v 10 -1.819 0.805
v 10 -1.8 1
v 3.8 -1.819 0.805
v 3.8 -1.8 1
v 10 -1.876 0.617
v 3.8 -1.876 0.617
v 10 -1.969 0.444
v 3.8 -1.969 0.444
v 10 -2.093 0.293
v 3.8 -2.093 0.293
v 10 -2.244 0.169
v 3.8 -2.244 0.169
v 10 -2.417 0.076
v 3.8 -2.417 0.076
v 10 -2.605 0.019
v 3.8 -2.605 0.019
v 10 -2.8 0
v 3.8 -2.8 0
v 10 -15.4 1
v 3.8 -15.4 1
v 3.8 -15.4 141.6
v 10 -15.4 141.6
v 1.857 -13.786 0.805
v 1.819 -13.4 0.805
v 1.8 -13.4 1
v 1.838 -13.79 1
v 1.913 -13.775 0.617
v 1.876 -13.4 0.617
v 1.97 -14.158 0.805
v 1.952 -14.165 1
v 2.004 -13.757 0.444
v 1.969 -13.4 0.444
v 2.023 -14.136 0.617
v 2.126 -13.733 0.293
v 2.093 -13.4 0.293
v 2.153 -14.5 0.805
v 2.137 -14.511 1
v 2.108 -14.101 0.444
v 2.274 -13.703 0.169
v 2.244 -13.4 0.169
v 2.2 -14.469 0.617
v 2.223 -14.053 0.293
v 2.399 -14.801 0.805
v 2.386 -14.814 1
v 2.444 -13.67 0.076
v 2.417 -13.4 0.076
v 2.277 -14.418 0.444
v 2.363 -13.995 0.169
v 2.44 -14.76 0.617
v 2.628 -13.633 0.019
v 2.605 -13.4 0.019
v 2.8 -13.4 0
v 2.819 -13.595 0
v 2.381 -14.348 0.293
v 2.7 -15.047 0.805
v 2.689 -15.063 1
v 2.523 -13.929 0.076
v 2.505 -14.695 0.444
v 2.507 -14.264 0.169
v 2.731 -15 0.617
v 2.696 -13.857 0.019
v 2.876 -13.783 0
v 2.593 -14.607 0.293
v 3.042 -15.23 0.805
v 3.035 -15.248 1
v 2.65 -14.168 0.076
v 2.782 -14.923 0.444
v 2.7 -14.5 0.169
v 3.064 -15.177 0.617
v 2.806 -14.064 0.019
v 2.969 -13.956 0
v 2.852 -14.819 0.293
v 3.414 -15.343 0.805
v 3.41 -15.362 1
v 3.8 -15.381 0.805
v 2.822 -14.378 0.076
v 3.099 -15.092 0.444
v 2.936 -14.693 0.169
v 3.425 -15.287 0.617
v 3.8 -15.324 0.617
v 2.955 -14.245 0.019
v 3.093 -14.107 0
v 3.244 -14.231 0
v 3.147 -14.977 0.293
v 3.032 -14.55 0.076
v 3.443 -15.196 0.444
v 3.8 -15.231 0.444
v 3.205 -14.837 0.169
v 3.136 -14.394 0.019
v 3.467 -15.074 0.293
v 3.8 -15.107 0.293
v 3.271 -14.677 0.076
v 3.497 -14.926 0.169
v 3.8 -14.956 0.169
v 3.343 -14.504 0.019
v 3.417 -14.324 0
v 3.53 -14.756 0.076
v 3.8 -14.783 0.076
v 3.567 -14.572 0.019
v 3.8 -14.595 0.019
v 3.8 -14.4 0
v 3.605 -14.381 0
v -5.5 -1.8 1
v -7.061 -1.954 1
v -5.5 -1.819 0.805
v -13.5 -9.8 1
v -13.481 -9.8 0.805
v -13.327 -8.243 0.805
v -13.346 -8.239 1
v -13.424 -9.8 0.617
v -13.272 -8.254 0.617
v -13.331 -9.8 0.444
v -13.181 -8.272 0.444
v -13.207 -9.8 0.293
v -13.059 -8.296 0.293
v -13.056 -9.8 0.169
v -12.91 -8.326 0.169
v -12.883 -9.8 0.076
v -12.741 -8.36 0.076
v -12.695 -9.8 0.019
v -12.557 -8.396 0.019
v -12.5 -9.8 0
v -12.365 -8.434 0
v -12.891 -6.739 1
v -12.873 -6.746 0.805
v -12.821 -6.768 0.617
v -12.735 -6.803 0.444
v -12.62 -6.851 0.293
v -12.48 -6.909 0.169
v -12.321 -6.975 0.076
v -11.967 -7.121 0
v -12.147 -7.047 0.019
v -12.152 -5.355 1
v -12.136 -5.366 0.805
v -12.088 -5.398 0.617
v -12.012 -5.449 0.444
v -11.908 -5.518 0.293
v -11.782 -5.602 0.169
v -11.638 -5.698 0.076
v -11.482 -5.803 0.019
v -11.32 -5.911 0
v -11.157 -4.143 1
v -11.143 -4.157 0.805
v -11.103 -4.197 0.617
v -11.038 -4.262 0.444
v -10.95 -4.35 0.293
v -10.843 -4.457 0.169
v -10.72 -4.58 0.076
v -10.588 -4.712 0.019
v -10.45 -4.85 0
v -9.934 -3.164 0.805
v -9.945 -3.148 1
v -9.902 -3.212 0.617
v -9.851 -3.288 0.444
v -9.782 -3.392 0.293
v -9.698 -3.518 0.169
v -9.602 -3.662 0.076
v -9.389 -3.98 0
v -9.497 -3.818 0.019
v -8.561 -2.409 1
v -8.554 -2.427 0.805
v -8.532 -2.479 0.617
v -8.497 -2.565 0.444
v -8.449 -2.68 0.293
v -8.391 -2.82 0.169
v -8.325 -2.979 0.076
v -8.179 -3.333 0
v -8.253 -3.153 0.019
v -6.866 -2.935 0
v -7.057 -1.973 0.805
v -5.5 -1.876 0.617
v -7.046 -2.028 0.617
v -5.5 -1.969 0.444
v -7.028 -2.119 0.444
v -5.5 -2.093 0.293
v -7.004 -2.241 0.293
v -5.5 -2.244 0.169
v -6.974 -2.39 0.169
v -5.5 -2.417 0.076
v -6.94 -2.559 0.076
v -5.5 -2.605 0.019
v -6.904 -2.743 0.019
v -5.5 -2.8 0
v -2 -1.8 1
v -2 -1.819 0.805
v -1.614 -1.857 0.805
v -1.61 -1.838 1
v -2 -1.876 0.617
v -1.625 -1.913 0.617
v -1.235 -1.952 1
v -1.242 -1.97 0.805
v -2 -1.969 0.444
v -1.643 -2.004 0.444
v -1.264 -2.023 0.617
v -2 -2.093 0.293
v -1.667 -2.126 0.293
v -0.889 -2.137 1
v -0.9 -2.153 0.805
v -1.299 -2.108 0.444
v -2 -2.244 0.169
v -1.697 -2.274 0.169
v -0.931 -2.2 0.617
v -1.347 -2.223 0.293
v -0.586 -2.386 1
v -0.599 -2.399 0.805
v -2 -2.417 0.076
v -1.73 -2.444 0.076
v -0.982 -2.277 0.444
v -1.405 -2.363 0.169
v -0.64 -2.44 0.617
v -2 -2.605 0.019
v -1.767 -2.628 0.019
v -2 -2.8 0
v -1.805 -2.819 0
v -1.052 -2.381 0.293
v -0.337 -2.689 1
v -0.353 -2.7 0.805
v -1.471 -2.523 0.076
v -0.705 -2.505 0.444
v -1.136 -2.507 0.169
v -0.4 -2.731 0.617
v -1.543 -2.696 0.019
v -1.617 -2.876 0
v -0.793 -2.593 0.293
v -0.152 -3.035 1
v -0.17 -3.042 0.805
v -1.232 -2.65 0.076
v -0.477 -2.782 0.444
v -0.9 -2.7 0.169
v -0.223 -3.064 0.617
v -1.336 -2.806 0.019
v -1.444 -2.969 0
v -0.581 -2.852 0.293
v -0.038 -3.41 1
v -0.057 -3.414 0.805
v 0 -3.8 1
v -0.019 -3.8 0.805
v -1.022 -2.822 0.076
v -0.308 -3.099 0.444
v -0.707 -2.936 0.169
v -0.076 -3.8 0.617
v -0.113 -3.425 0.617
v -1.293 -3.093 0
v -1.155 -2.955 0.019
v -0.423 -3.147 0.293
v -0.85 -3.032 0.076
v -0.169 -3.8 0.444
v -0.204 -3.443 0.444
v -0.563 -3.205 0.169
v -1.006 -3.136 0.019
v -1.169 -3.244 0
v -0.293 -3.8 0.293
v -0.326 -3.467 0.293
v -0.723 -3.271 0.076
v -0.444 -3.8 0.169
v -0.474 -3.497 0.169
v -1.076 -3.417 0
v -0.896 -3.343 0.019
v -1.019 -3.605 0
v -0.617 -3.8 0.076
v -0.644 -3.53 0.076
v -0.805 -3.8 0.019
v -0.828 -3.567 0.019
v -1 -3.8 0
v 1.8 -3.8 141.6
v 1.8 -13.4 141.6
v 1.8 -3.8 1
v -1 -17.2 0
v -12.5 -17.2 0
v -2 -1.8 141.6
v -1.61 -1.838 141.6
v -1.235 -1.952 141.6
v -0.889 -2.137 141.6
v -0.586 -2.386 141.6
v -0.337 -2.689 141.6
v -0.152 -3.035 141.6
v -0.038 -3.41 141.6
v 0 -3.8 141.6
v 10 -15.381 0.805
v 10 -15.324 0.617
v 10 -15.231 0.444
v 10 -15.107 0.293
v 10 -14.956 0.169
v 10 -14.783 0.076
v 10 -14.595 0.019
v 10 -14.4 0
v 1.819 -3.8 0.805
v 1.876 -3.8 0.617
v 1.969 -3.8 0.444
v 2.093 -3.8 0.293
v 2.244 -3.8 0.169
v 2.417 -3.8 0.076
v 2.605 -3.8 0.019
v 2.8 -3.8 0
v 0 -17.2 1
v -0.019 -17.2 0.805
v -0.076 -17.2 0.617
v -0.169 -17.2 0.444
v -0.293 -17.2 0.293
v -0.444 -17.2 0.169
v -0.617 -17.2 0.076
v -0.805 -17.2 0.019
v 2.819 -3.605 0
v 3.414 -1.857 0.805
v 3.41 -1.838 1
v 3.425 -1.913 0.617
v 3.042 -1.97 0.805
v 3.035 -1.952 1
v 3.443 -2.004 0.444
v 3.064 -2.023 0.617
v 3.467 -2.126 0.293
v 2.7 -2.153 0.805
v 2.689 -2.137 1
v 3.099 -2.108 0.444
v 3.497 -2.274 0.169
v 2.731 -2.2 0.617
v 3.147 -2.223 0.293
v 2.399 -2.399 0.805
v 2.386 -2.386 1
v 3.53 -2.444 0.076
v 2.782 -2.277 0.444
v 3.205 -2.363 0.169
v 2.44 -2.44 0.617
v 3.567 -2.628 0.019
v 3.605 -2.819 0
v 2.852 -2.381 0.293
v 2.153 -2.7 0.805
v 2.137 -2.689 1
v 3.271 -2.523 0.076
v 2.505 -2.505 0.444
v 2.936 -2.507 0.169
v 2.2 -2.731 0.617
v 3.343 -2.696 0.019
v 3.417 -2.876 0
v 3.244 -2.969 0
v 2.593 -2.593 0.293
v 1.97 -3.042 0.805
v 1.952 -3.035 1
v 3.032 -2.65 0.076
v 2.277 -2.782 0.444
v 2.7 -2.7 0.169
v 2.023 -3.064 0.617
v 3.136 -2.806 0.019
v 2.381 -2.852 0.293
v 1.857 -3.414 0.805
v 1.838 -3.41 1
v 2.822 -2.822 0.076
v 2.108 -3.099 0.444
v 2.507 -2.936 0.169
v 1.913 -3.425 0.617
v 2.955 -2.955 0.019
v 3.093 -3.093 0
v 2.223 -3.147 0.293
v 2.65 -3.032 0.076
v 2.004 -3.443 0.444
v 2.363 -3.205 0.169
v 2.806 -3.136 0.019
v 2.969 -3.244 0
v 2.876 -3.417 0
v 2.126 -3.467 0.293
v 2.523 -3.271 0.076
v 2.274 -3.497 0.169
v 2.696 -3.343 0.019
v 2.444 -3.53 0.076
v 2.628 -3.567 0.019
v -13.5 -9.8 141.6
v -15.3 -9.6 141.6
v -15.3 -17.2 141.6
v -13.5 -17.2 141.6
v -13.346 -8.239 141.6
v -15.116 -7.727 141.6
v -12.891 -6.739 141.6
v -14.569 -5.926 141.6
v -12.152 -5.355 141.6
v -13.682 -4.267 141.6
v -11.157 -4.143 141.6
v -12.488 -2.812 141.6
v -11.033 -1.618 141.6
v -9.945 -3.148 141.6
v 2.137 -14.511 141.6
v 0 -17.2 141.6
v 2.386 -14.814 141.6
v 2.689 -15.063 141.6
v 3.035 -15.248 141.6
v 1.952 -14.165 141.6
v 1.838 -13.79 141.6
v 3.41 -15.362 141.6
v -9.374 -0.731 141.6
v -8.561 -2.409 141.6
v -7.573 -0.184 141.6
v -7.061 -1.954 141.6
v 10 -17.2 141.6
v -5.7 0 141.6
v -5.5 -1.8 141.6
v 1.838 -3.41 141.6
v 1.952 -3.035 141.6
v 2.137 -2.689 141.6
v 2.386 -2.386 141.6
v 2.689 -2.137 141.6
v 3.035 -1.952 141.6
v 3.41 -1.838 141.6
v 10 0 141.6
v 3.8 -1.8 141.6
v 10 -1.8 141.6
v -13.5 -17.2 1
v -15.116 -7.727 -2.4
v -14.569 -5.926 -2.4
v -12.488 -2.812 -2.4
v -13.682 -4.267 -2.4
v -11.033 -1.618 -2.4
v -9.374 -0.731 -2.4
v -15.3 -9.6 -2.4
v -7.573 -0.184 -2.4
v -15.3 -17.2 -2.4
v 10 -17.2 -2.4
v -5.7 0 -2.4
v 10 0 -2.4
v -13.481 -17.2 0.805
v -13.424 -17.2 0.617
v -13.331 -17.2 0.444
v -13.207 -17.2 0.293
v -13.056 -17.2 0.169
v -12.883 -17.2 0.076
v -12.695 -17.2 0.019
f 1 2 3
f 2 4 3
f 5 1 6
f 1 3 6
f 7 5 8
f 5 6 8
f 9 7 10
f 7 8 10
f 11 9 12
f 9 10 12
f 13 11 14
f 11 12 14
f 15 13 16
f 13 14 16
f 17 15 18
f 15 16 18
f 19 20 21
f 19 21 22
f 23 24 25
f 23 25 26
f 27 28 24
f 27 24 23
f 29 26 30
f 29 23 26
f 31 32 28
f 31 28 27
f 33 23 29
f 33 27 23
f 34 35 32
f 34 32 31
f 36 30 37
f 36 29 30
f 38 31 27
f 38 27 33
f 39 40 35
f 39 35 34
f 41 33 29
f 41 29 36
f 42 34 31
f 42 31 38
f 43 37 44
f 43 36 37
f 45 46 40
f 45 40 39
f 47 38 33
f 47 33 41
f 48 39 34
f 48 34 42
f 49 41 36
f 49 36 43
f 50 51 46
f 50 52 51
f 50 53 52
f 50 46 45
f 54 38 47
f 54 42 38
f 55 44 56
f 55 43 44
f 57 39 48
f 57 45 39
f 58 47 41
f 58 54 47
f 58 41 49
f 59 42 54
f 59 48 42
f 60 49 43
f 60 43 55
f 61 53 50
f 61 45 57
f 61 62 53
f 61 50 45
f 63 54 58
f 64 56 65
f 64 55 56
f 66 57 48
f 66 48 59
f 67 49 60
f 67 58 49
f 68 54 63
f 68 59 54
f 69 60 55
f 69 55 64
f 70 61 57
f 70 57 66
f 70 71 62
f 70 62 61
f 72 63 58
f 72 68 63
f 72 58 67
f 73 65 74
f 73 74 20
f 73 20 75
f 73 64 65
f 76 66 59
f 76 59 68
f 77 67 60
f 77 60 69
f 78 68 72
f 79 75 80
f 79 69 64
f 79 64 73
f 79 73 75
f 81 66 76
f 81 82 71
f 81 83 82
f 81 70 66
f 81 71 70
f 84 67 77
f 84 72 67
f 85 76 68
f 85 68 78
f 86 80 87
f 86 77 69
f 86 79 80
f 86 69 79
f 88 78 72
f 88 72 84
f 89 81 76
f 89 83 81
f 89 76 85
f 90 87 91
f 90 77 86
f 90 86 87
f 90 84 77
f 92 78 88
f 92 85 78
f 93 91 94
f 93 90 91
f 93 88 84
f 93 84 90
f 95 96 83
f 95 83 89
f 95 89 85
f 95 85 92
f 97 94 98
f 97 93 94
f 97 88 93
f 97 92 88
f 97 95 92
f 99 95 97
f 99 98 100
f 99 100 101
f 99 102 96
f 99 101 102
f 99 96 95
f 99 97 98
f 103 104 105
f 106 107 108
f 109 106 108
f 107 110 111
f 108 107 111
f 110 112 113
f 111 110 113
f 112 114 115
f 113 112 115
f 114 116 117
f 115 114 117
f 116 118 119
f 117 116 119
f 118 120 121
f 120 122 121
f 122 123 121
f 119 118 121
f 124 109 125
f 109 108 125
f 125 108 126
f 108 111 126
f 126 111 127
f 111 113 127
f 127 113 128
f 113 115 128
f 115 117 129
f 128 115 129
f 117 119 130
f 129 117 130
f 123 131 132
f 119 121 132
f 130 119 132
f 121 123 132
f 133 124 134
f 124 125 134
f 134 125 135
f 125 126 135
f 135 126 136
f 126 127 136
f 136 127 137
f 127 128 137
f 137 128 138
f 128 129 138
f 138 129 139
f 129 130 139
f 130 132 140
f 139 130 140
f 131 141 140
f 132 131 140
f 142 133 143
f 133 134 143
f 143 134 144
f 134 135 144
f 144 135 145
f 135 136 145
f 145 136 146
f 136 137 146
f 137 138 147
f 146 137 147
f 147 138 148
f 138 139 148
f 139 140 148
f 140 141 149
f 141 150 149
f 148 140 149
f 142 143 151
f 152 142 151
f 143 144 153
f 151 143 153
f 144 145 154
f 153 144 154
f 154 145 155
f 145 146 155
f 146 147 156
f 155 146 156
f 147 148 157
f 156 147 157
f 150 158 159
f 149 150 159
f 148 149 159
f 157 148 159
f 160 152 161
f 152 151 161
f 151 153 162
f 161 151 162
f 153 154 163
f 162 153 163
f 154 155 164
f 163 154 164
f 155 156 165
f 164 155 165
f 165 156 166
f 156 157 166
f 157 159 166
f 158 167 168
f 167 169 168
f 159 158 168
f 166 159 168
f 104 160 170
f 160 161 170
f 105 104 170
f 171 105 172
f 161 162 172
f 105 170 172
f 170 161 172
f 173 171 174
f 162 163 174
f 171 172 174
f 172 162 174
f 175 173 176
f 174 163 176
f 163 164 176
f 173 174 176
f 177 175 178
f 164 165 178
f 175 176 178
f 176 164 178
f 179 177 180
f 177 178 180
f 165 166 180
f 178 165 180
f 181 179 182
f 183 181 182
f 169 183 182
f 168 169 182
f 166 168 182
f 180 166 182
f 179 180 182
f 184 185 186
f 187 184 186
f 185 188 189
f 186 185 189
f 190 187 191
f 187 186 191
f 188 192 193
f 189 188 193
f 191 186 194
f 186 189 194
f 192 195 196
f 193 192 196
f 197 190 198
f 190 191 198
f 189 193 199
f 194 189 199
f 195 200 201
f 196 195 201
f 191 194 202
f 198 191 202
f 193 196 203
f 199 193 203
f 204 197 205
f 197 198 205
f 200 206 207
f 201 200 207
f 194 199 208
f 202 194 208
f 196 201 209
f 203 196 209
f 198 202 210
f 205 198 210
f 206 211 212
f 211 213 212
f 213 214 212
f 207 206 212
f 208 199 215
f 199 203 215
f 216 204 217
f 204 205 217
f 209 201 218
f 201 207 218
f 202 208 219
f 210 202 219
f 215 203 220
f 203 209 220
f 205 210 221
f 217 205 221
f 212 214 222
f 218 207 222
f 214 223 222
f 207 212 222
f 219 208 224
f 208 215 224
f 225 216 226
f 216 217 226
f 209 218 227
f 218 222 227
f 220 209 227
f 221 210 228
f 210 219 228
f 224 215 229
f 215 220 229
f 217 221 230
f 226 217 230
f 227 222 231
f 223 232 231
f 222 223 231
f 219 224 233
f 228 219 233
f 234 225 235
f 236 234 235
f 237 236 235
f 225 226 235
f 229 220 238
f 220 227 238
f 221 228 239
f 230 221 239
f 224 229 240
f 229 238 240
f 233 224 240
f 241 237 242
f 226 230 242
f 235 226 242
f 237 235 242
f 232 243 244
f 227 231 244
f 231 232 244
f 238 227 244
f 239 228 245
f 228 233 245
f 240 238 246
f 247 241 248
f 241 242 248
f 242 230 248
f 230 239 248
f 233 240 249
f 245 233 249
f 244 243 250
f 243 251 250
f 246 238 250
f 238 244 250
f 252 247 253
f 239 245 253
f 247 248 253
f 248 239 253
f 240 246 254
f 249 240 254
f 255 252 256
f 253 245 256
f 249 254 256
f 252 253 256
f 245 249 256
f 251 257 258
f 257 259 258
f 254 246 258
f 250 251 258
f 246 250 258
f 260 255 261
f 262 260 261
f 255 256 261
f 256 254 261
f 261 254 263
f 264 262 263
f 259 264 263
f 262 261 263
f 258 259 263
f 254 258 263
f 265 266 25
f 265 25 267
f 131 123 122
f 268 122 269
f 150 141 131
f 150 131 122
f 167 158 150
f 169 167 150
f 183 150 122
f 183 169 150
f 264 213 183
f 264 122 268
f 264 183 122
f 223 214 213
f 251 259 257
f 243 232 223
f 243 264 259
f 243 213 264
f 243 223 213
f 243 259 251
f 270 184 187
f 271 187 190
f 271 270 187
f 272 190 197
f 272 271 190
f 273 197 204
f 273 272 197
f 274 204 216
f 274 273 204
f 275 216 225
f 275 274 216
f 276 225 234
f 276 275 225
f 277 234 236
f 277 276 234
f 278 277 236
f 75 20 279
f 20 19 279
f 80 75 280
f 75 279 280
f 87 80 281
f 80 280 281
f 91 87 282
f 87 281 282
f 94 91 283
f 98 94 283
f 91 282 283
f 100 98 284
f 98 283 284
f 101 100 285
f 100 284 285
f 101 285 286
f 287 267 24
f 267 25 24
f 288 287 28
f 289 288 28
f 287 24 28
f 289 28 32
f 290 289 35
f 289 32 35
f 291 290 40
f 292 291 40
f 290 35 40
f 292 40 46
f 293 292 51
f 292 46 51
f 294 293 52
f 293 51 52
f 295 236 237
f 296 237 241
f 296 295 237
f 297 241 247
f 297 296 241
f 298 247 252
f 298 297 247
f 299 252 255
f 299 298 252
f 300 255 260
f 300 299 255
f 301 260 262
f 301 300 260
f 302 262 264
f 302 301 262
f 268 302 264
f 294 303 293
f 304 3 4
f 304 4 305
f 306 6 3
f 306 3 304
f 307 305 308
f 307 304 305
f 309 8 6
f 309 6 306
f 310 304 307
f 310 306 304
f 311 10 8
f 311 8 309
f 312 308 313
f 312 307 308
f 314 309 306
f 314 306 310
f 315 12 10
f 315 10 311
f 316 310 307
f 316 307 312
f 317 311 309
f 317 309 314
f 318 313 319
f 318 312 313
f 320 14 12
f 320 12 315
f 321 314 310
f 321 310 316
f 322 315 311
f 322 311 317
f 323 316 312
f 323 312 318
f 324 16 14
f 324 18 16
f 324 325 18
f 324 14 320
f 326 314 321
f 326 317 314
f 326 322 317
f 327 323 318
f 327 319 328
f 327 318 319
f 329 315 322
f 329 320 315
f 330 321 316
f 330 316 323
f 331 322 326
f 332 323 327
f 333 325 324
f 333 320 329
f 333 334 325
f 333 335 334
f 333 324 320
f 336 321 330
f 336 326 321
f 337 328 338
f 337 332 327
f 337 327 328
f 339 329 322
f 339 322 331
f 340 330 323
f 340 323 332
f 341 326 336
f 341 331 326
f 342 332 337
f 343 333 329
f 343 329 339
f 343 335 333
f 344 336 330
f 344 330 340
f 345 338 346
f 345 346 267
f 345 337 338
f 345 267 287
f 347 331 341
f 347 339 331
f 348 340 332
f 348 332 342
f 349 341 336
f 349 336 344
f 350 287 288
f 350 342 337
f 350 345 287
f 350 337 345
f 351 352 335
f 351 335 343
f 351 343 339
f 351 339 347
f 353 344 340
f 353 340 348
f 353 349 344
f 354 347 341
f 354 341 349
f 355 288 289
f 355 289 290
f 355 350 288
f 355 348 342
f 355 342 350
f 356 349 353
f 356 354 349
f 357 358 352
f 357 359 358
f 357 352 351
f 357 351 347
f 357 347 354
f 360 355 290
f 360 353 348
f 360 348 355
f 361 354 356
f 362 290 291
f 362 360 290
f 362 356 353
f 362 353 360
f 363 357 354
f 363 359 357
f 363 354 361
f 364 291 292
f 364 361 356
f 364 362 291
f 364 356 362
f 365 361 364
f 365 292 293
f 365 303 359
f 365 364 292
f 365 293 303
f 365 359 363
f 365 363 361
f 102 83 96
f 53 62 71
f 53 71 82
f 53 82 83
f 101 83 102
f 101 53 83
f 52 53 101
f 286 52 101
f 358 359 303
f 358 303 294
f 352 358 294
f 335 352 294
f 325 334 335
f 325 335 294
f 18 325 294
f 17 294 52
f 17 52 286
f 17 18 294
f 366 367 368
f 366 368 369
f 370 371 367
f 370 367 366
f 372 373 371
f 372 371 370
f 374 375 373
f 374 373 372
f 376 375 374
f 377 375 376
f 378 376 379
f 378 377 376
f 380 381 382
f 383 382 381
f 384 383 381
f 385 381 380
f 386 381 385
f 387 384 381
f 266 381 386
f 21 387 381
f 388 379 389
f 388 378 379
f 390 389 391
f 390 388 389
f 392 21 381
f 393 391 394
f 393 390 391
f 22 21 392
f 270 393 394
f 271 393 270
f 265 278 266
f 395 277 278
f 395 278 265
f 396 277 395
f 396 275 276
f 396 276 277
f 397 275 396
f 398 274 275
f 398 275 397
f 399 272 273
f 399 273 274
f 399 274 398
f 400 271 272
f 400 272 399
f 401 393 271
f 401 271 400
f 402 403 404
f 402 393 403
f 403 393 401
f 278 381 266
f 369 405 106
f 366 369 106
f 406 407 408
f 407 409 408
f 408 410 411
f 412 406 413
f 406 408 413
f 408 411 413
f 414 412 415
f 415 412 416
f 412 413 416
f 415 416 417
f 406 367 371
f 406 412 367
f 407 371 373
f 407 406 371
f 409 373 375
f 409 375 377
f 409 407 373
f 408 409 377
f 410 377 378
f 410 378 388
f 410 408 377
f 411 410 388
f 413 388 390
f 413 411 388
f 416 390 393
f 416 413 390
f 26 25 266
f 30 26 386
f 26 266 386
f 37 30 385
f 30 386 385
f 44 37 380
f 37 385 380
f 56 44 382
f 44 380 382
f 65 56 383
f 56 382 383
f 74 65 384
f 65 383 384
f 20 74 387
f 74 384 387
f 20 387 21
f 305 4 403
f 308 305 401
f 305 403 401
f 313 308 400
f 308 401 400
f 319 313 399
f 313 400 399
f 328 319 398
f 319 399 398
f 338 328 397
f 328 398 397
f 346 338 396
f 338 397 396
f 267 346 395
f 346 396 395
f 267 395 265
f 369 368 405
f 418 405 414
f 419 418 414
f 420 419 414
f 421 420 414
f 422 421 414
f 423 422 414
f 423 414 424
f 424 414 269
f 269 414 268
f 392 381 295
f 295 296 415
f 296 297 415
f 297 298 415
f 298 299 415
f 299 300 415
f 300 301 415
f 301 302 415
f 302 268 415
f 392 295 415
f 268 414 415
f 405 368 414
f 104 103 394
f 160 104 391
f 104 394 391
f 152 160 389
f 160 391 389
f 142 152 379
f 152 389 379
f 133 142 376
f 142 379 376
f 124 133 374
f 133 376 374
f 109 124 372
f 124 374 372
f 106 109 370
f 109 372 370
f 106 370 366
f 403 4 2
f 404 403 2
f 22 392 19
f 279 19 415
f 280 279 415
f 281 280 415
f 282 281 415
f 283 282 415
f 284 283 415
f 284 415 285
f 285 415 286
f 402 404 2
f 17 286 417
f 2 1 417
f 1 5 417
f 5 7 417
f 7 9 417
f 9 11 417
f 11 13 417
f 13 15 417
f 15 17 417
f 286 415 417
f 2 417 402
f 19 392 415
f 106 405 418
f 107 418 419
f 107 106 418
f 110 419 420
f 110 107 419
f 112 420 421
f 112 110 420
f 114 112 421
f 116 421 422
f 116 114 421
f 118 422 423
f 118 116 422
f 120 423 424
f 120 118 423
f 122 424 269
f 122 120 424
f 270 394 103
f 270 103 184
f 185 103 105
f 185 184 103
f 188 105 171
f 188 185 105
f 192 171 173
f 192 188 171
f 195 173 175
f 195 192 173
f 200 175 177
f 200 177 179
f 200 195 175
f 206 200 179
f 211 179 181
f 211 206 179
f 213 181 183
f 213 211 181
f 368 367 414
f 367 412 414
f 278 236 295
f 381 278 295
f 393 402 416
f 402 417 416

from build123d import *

# Parameters (mm, degrees)
F0_W     = 13.5
F0_H     = 1.8
F0_H_2   = 15.4
F0_W_2   = 8.2
F0_H_3   = 13.6
F1_DEPTH = 2.4
F2_DEPTH = 141.6
F3_R     = 8
F4_R     = 9.6
F5_R     = 2
F6_R     = 1


with BuildPart() as f1:
    # F0 (on Top) → F1 (new body)
    with BuildSketch(Plane.XY):
        Polygon((-13.5, -1.8), (-13.5, 0), (-15.3, 0), (-15.3, -17.2), (-13.5, -17.2), align=None)
        with Locations((-6.75, -0.9)):
            Rectangle(F0_W, F0_H)
        with Locations((-6.75, -9.5)):
            Rectangle(F0_W, F0_H_2)
        Polygon((1.8, -1.8), (0, -1.8), (0, -17.2), (1.8, -17.2), (1.8, -15.4), align=None)
        with Locations((5.9, -16.3)):
            Rectangle(F0_W_2, F0_H)
        with Locations((5.9, -8.6)):
            Rectangle(F0_W_2, F0_H_3)
        Polygon((10, 0), (0, 0), (0, -1.8), (1.8, -1.8), (10, -1.8), align=None)
    extrude(amount=-F1_DEPTH)

    # F0 (on Top) → F2 (join)
    with BuildSketch(Plane.XY):
        Polygon((-13.5, -1.8), (-13.5, 0), (-15.3, 0), (-15.3, -17.2), (-13.5, -17.2), align=None)
        Polygon((1.8, -1.8), (0, -1.8), (0, -17.2), (1.8, -17.2), (1.8, -15.4), align=None)
        with Locations((-6.75, -0.9)):
            Rectangle(F0_W, F0_H)
        Polygon((10, 0), (0, 0), (0, -1.8), (1.8, -1.8), (10, -1.8), align=None)
        with Locations((5.9, -16.3)):
            Rectangle(F0_W_2, F0_H)
    extrude(amount=F2_DEPTH)

    # F3
    f3_edges = [f1.edges().sort_by_distance(p)[0] for p in [
        (-13.5, -1.8, 70.8),
    ]]
    fillet(f3_edges, radius=F3_R)

    # F4
    f4_edges = [f1.edges().sort_by_distance(p)[0] for p in [
        (-15.3, 0, 69.6),
    ]]
    fillet(f4_edges, radius=F4_R)

    # F5
    f5_edges = [f1.edges().sort_by_distance(p)[0] for p in [
        (0, -1.8, 70.8),
        (1.8, -1.8, 70.8),
        (1.8, -15.4, 70.8),
    ]]
    fillet(f5_edges, radius=F5_R)

    # F6
    f6_edges = [f1.edges().sort_by_distance(p)[0] for p in [
        (6.9, -15.4, 0),
        (2.385786, -14.814214, 0),
        (1.8, -8.6, 0),
        (2.385786, -2.385786, 0),
        (6.9, -1.8, 0),
        (0, -10.5, 0),
        (-0.585786, -2.385786, 0),
        (-3.75, -1.8, 0),
        (-11.156854, -4.143146, 0),
        (-13.5, -13.5, 0),
    ]]
    fillet(f6_edges, radius=F6_R)


solid = f1.part
